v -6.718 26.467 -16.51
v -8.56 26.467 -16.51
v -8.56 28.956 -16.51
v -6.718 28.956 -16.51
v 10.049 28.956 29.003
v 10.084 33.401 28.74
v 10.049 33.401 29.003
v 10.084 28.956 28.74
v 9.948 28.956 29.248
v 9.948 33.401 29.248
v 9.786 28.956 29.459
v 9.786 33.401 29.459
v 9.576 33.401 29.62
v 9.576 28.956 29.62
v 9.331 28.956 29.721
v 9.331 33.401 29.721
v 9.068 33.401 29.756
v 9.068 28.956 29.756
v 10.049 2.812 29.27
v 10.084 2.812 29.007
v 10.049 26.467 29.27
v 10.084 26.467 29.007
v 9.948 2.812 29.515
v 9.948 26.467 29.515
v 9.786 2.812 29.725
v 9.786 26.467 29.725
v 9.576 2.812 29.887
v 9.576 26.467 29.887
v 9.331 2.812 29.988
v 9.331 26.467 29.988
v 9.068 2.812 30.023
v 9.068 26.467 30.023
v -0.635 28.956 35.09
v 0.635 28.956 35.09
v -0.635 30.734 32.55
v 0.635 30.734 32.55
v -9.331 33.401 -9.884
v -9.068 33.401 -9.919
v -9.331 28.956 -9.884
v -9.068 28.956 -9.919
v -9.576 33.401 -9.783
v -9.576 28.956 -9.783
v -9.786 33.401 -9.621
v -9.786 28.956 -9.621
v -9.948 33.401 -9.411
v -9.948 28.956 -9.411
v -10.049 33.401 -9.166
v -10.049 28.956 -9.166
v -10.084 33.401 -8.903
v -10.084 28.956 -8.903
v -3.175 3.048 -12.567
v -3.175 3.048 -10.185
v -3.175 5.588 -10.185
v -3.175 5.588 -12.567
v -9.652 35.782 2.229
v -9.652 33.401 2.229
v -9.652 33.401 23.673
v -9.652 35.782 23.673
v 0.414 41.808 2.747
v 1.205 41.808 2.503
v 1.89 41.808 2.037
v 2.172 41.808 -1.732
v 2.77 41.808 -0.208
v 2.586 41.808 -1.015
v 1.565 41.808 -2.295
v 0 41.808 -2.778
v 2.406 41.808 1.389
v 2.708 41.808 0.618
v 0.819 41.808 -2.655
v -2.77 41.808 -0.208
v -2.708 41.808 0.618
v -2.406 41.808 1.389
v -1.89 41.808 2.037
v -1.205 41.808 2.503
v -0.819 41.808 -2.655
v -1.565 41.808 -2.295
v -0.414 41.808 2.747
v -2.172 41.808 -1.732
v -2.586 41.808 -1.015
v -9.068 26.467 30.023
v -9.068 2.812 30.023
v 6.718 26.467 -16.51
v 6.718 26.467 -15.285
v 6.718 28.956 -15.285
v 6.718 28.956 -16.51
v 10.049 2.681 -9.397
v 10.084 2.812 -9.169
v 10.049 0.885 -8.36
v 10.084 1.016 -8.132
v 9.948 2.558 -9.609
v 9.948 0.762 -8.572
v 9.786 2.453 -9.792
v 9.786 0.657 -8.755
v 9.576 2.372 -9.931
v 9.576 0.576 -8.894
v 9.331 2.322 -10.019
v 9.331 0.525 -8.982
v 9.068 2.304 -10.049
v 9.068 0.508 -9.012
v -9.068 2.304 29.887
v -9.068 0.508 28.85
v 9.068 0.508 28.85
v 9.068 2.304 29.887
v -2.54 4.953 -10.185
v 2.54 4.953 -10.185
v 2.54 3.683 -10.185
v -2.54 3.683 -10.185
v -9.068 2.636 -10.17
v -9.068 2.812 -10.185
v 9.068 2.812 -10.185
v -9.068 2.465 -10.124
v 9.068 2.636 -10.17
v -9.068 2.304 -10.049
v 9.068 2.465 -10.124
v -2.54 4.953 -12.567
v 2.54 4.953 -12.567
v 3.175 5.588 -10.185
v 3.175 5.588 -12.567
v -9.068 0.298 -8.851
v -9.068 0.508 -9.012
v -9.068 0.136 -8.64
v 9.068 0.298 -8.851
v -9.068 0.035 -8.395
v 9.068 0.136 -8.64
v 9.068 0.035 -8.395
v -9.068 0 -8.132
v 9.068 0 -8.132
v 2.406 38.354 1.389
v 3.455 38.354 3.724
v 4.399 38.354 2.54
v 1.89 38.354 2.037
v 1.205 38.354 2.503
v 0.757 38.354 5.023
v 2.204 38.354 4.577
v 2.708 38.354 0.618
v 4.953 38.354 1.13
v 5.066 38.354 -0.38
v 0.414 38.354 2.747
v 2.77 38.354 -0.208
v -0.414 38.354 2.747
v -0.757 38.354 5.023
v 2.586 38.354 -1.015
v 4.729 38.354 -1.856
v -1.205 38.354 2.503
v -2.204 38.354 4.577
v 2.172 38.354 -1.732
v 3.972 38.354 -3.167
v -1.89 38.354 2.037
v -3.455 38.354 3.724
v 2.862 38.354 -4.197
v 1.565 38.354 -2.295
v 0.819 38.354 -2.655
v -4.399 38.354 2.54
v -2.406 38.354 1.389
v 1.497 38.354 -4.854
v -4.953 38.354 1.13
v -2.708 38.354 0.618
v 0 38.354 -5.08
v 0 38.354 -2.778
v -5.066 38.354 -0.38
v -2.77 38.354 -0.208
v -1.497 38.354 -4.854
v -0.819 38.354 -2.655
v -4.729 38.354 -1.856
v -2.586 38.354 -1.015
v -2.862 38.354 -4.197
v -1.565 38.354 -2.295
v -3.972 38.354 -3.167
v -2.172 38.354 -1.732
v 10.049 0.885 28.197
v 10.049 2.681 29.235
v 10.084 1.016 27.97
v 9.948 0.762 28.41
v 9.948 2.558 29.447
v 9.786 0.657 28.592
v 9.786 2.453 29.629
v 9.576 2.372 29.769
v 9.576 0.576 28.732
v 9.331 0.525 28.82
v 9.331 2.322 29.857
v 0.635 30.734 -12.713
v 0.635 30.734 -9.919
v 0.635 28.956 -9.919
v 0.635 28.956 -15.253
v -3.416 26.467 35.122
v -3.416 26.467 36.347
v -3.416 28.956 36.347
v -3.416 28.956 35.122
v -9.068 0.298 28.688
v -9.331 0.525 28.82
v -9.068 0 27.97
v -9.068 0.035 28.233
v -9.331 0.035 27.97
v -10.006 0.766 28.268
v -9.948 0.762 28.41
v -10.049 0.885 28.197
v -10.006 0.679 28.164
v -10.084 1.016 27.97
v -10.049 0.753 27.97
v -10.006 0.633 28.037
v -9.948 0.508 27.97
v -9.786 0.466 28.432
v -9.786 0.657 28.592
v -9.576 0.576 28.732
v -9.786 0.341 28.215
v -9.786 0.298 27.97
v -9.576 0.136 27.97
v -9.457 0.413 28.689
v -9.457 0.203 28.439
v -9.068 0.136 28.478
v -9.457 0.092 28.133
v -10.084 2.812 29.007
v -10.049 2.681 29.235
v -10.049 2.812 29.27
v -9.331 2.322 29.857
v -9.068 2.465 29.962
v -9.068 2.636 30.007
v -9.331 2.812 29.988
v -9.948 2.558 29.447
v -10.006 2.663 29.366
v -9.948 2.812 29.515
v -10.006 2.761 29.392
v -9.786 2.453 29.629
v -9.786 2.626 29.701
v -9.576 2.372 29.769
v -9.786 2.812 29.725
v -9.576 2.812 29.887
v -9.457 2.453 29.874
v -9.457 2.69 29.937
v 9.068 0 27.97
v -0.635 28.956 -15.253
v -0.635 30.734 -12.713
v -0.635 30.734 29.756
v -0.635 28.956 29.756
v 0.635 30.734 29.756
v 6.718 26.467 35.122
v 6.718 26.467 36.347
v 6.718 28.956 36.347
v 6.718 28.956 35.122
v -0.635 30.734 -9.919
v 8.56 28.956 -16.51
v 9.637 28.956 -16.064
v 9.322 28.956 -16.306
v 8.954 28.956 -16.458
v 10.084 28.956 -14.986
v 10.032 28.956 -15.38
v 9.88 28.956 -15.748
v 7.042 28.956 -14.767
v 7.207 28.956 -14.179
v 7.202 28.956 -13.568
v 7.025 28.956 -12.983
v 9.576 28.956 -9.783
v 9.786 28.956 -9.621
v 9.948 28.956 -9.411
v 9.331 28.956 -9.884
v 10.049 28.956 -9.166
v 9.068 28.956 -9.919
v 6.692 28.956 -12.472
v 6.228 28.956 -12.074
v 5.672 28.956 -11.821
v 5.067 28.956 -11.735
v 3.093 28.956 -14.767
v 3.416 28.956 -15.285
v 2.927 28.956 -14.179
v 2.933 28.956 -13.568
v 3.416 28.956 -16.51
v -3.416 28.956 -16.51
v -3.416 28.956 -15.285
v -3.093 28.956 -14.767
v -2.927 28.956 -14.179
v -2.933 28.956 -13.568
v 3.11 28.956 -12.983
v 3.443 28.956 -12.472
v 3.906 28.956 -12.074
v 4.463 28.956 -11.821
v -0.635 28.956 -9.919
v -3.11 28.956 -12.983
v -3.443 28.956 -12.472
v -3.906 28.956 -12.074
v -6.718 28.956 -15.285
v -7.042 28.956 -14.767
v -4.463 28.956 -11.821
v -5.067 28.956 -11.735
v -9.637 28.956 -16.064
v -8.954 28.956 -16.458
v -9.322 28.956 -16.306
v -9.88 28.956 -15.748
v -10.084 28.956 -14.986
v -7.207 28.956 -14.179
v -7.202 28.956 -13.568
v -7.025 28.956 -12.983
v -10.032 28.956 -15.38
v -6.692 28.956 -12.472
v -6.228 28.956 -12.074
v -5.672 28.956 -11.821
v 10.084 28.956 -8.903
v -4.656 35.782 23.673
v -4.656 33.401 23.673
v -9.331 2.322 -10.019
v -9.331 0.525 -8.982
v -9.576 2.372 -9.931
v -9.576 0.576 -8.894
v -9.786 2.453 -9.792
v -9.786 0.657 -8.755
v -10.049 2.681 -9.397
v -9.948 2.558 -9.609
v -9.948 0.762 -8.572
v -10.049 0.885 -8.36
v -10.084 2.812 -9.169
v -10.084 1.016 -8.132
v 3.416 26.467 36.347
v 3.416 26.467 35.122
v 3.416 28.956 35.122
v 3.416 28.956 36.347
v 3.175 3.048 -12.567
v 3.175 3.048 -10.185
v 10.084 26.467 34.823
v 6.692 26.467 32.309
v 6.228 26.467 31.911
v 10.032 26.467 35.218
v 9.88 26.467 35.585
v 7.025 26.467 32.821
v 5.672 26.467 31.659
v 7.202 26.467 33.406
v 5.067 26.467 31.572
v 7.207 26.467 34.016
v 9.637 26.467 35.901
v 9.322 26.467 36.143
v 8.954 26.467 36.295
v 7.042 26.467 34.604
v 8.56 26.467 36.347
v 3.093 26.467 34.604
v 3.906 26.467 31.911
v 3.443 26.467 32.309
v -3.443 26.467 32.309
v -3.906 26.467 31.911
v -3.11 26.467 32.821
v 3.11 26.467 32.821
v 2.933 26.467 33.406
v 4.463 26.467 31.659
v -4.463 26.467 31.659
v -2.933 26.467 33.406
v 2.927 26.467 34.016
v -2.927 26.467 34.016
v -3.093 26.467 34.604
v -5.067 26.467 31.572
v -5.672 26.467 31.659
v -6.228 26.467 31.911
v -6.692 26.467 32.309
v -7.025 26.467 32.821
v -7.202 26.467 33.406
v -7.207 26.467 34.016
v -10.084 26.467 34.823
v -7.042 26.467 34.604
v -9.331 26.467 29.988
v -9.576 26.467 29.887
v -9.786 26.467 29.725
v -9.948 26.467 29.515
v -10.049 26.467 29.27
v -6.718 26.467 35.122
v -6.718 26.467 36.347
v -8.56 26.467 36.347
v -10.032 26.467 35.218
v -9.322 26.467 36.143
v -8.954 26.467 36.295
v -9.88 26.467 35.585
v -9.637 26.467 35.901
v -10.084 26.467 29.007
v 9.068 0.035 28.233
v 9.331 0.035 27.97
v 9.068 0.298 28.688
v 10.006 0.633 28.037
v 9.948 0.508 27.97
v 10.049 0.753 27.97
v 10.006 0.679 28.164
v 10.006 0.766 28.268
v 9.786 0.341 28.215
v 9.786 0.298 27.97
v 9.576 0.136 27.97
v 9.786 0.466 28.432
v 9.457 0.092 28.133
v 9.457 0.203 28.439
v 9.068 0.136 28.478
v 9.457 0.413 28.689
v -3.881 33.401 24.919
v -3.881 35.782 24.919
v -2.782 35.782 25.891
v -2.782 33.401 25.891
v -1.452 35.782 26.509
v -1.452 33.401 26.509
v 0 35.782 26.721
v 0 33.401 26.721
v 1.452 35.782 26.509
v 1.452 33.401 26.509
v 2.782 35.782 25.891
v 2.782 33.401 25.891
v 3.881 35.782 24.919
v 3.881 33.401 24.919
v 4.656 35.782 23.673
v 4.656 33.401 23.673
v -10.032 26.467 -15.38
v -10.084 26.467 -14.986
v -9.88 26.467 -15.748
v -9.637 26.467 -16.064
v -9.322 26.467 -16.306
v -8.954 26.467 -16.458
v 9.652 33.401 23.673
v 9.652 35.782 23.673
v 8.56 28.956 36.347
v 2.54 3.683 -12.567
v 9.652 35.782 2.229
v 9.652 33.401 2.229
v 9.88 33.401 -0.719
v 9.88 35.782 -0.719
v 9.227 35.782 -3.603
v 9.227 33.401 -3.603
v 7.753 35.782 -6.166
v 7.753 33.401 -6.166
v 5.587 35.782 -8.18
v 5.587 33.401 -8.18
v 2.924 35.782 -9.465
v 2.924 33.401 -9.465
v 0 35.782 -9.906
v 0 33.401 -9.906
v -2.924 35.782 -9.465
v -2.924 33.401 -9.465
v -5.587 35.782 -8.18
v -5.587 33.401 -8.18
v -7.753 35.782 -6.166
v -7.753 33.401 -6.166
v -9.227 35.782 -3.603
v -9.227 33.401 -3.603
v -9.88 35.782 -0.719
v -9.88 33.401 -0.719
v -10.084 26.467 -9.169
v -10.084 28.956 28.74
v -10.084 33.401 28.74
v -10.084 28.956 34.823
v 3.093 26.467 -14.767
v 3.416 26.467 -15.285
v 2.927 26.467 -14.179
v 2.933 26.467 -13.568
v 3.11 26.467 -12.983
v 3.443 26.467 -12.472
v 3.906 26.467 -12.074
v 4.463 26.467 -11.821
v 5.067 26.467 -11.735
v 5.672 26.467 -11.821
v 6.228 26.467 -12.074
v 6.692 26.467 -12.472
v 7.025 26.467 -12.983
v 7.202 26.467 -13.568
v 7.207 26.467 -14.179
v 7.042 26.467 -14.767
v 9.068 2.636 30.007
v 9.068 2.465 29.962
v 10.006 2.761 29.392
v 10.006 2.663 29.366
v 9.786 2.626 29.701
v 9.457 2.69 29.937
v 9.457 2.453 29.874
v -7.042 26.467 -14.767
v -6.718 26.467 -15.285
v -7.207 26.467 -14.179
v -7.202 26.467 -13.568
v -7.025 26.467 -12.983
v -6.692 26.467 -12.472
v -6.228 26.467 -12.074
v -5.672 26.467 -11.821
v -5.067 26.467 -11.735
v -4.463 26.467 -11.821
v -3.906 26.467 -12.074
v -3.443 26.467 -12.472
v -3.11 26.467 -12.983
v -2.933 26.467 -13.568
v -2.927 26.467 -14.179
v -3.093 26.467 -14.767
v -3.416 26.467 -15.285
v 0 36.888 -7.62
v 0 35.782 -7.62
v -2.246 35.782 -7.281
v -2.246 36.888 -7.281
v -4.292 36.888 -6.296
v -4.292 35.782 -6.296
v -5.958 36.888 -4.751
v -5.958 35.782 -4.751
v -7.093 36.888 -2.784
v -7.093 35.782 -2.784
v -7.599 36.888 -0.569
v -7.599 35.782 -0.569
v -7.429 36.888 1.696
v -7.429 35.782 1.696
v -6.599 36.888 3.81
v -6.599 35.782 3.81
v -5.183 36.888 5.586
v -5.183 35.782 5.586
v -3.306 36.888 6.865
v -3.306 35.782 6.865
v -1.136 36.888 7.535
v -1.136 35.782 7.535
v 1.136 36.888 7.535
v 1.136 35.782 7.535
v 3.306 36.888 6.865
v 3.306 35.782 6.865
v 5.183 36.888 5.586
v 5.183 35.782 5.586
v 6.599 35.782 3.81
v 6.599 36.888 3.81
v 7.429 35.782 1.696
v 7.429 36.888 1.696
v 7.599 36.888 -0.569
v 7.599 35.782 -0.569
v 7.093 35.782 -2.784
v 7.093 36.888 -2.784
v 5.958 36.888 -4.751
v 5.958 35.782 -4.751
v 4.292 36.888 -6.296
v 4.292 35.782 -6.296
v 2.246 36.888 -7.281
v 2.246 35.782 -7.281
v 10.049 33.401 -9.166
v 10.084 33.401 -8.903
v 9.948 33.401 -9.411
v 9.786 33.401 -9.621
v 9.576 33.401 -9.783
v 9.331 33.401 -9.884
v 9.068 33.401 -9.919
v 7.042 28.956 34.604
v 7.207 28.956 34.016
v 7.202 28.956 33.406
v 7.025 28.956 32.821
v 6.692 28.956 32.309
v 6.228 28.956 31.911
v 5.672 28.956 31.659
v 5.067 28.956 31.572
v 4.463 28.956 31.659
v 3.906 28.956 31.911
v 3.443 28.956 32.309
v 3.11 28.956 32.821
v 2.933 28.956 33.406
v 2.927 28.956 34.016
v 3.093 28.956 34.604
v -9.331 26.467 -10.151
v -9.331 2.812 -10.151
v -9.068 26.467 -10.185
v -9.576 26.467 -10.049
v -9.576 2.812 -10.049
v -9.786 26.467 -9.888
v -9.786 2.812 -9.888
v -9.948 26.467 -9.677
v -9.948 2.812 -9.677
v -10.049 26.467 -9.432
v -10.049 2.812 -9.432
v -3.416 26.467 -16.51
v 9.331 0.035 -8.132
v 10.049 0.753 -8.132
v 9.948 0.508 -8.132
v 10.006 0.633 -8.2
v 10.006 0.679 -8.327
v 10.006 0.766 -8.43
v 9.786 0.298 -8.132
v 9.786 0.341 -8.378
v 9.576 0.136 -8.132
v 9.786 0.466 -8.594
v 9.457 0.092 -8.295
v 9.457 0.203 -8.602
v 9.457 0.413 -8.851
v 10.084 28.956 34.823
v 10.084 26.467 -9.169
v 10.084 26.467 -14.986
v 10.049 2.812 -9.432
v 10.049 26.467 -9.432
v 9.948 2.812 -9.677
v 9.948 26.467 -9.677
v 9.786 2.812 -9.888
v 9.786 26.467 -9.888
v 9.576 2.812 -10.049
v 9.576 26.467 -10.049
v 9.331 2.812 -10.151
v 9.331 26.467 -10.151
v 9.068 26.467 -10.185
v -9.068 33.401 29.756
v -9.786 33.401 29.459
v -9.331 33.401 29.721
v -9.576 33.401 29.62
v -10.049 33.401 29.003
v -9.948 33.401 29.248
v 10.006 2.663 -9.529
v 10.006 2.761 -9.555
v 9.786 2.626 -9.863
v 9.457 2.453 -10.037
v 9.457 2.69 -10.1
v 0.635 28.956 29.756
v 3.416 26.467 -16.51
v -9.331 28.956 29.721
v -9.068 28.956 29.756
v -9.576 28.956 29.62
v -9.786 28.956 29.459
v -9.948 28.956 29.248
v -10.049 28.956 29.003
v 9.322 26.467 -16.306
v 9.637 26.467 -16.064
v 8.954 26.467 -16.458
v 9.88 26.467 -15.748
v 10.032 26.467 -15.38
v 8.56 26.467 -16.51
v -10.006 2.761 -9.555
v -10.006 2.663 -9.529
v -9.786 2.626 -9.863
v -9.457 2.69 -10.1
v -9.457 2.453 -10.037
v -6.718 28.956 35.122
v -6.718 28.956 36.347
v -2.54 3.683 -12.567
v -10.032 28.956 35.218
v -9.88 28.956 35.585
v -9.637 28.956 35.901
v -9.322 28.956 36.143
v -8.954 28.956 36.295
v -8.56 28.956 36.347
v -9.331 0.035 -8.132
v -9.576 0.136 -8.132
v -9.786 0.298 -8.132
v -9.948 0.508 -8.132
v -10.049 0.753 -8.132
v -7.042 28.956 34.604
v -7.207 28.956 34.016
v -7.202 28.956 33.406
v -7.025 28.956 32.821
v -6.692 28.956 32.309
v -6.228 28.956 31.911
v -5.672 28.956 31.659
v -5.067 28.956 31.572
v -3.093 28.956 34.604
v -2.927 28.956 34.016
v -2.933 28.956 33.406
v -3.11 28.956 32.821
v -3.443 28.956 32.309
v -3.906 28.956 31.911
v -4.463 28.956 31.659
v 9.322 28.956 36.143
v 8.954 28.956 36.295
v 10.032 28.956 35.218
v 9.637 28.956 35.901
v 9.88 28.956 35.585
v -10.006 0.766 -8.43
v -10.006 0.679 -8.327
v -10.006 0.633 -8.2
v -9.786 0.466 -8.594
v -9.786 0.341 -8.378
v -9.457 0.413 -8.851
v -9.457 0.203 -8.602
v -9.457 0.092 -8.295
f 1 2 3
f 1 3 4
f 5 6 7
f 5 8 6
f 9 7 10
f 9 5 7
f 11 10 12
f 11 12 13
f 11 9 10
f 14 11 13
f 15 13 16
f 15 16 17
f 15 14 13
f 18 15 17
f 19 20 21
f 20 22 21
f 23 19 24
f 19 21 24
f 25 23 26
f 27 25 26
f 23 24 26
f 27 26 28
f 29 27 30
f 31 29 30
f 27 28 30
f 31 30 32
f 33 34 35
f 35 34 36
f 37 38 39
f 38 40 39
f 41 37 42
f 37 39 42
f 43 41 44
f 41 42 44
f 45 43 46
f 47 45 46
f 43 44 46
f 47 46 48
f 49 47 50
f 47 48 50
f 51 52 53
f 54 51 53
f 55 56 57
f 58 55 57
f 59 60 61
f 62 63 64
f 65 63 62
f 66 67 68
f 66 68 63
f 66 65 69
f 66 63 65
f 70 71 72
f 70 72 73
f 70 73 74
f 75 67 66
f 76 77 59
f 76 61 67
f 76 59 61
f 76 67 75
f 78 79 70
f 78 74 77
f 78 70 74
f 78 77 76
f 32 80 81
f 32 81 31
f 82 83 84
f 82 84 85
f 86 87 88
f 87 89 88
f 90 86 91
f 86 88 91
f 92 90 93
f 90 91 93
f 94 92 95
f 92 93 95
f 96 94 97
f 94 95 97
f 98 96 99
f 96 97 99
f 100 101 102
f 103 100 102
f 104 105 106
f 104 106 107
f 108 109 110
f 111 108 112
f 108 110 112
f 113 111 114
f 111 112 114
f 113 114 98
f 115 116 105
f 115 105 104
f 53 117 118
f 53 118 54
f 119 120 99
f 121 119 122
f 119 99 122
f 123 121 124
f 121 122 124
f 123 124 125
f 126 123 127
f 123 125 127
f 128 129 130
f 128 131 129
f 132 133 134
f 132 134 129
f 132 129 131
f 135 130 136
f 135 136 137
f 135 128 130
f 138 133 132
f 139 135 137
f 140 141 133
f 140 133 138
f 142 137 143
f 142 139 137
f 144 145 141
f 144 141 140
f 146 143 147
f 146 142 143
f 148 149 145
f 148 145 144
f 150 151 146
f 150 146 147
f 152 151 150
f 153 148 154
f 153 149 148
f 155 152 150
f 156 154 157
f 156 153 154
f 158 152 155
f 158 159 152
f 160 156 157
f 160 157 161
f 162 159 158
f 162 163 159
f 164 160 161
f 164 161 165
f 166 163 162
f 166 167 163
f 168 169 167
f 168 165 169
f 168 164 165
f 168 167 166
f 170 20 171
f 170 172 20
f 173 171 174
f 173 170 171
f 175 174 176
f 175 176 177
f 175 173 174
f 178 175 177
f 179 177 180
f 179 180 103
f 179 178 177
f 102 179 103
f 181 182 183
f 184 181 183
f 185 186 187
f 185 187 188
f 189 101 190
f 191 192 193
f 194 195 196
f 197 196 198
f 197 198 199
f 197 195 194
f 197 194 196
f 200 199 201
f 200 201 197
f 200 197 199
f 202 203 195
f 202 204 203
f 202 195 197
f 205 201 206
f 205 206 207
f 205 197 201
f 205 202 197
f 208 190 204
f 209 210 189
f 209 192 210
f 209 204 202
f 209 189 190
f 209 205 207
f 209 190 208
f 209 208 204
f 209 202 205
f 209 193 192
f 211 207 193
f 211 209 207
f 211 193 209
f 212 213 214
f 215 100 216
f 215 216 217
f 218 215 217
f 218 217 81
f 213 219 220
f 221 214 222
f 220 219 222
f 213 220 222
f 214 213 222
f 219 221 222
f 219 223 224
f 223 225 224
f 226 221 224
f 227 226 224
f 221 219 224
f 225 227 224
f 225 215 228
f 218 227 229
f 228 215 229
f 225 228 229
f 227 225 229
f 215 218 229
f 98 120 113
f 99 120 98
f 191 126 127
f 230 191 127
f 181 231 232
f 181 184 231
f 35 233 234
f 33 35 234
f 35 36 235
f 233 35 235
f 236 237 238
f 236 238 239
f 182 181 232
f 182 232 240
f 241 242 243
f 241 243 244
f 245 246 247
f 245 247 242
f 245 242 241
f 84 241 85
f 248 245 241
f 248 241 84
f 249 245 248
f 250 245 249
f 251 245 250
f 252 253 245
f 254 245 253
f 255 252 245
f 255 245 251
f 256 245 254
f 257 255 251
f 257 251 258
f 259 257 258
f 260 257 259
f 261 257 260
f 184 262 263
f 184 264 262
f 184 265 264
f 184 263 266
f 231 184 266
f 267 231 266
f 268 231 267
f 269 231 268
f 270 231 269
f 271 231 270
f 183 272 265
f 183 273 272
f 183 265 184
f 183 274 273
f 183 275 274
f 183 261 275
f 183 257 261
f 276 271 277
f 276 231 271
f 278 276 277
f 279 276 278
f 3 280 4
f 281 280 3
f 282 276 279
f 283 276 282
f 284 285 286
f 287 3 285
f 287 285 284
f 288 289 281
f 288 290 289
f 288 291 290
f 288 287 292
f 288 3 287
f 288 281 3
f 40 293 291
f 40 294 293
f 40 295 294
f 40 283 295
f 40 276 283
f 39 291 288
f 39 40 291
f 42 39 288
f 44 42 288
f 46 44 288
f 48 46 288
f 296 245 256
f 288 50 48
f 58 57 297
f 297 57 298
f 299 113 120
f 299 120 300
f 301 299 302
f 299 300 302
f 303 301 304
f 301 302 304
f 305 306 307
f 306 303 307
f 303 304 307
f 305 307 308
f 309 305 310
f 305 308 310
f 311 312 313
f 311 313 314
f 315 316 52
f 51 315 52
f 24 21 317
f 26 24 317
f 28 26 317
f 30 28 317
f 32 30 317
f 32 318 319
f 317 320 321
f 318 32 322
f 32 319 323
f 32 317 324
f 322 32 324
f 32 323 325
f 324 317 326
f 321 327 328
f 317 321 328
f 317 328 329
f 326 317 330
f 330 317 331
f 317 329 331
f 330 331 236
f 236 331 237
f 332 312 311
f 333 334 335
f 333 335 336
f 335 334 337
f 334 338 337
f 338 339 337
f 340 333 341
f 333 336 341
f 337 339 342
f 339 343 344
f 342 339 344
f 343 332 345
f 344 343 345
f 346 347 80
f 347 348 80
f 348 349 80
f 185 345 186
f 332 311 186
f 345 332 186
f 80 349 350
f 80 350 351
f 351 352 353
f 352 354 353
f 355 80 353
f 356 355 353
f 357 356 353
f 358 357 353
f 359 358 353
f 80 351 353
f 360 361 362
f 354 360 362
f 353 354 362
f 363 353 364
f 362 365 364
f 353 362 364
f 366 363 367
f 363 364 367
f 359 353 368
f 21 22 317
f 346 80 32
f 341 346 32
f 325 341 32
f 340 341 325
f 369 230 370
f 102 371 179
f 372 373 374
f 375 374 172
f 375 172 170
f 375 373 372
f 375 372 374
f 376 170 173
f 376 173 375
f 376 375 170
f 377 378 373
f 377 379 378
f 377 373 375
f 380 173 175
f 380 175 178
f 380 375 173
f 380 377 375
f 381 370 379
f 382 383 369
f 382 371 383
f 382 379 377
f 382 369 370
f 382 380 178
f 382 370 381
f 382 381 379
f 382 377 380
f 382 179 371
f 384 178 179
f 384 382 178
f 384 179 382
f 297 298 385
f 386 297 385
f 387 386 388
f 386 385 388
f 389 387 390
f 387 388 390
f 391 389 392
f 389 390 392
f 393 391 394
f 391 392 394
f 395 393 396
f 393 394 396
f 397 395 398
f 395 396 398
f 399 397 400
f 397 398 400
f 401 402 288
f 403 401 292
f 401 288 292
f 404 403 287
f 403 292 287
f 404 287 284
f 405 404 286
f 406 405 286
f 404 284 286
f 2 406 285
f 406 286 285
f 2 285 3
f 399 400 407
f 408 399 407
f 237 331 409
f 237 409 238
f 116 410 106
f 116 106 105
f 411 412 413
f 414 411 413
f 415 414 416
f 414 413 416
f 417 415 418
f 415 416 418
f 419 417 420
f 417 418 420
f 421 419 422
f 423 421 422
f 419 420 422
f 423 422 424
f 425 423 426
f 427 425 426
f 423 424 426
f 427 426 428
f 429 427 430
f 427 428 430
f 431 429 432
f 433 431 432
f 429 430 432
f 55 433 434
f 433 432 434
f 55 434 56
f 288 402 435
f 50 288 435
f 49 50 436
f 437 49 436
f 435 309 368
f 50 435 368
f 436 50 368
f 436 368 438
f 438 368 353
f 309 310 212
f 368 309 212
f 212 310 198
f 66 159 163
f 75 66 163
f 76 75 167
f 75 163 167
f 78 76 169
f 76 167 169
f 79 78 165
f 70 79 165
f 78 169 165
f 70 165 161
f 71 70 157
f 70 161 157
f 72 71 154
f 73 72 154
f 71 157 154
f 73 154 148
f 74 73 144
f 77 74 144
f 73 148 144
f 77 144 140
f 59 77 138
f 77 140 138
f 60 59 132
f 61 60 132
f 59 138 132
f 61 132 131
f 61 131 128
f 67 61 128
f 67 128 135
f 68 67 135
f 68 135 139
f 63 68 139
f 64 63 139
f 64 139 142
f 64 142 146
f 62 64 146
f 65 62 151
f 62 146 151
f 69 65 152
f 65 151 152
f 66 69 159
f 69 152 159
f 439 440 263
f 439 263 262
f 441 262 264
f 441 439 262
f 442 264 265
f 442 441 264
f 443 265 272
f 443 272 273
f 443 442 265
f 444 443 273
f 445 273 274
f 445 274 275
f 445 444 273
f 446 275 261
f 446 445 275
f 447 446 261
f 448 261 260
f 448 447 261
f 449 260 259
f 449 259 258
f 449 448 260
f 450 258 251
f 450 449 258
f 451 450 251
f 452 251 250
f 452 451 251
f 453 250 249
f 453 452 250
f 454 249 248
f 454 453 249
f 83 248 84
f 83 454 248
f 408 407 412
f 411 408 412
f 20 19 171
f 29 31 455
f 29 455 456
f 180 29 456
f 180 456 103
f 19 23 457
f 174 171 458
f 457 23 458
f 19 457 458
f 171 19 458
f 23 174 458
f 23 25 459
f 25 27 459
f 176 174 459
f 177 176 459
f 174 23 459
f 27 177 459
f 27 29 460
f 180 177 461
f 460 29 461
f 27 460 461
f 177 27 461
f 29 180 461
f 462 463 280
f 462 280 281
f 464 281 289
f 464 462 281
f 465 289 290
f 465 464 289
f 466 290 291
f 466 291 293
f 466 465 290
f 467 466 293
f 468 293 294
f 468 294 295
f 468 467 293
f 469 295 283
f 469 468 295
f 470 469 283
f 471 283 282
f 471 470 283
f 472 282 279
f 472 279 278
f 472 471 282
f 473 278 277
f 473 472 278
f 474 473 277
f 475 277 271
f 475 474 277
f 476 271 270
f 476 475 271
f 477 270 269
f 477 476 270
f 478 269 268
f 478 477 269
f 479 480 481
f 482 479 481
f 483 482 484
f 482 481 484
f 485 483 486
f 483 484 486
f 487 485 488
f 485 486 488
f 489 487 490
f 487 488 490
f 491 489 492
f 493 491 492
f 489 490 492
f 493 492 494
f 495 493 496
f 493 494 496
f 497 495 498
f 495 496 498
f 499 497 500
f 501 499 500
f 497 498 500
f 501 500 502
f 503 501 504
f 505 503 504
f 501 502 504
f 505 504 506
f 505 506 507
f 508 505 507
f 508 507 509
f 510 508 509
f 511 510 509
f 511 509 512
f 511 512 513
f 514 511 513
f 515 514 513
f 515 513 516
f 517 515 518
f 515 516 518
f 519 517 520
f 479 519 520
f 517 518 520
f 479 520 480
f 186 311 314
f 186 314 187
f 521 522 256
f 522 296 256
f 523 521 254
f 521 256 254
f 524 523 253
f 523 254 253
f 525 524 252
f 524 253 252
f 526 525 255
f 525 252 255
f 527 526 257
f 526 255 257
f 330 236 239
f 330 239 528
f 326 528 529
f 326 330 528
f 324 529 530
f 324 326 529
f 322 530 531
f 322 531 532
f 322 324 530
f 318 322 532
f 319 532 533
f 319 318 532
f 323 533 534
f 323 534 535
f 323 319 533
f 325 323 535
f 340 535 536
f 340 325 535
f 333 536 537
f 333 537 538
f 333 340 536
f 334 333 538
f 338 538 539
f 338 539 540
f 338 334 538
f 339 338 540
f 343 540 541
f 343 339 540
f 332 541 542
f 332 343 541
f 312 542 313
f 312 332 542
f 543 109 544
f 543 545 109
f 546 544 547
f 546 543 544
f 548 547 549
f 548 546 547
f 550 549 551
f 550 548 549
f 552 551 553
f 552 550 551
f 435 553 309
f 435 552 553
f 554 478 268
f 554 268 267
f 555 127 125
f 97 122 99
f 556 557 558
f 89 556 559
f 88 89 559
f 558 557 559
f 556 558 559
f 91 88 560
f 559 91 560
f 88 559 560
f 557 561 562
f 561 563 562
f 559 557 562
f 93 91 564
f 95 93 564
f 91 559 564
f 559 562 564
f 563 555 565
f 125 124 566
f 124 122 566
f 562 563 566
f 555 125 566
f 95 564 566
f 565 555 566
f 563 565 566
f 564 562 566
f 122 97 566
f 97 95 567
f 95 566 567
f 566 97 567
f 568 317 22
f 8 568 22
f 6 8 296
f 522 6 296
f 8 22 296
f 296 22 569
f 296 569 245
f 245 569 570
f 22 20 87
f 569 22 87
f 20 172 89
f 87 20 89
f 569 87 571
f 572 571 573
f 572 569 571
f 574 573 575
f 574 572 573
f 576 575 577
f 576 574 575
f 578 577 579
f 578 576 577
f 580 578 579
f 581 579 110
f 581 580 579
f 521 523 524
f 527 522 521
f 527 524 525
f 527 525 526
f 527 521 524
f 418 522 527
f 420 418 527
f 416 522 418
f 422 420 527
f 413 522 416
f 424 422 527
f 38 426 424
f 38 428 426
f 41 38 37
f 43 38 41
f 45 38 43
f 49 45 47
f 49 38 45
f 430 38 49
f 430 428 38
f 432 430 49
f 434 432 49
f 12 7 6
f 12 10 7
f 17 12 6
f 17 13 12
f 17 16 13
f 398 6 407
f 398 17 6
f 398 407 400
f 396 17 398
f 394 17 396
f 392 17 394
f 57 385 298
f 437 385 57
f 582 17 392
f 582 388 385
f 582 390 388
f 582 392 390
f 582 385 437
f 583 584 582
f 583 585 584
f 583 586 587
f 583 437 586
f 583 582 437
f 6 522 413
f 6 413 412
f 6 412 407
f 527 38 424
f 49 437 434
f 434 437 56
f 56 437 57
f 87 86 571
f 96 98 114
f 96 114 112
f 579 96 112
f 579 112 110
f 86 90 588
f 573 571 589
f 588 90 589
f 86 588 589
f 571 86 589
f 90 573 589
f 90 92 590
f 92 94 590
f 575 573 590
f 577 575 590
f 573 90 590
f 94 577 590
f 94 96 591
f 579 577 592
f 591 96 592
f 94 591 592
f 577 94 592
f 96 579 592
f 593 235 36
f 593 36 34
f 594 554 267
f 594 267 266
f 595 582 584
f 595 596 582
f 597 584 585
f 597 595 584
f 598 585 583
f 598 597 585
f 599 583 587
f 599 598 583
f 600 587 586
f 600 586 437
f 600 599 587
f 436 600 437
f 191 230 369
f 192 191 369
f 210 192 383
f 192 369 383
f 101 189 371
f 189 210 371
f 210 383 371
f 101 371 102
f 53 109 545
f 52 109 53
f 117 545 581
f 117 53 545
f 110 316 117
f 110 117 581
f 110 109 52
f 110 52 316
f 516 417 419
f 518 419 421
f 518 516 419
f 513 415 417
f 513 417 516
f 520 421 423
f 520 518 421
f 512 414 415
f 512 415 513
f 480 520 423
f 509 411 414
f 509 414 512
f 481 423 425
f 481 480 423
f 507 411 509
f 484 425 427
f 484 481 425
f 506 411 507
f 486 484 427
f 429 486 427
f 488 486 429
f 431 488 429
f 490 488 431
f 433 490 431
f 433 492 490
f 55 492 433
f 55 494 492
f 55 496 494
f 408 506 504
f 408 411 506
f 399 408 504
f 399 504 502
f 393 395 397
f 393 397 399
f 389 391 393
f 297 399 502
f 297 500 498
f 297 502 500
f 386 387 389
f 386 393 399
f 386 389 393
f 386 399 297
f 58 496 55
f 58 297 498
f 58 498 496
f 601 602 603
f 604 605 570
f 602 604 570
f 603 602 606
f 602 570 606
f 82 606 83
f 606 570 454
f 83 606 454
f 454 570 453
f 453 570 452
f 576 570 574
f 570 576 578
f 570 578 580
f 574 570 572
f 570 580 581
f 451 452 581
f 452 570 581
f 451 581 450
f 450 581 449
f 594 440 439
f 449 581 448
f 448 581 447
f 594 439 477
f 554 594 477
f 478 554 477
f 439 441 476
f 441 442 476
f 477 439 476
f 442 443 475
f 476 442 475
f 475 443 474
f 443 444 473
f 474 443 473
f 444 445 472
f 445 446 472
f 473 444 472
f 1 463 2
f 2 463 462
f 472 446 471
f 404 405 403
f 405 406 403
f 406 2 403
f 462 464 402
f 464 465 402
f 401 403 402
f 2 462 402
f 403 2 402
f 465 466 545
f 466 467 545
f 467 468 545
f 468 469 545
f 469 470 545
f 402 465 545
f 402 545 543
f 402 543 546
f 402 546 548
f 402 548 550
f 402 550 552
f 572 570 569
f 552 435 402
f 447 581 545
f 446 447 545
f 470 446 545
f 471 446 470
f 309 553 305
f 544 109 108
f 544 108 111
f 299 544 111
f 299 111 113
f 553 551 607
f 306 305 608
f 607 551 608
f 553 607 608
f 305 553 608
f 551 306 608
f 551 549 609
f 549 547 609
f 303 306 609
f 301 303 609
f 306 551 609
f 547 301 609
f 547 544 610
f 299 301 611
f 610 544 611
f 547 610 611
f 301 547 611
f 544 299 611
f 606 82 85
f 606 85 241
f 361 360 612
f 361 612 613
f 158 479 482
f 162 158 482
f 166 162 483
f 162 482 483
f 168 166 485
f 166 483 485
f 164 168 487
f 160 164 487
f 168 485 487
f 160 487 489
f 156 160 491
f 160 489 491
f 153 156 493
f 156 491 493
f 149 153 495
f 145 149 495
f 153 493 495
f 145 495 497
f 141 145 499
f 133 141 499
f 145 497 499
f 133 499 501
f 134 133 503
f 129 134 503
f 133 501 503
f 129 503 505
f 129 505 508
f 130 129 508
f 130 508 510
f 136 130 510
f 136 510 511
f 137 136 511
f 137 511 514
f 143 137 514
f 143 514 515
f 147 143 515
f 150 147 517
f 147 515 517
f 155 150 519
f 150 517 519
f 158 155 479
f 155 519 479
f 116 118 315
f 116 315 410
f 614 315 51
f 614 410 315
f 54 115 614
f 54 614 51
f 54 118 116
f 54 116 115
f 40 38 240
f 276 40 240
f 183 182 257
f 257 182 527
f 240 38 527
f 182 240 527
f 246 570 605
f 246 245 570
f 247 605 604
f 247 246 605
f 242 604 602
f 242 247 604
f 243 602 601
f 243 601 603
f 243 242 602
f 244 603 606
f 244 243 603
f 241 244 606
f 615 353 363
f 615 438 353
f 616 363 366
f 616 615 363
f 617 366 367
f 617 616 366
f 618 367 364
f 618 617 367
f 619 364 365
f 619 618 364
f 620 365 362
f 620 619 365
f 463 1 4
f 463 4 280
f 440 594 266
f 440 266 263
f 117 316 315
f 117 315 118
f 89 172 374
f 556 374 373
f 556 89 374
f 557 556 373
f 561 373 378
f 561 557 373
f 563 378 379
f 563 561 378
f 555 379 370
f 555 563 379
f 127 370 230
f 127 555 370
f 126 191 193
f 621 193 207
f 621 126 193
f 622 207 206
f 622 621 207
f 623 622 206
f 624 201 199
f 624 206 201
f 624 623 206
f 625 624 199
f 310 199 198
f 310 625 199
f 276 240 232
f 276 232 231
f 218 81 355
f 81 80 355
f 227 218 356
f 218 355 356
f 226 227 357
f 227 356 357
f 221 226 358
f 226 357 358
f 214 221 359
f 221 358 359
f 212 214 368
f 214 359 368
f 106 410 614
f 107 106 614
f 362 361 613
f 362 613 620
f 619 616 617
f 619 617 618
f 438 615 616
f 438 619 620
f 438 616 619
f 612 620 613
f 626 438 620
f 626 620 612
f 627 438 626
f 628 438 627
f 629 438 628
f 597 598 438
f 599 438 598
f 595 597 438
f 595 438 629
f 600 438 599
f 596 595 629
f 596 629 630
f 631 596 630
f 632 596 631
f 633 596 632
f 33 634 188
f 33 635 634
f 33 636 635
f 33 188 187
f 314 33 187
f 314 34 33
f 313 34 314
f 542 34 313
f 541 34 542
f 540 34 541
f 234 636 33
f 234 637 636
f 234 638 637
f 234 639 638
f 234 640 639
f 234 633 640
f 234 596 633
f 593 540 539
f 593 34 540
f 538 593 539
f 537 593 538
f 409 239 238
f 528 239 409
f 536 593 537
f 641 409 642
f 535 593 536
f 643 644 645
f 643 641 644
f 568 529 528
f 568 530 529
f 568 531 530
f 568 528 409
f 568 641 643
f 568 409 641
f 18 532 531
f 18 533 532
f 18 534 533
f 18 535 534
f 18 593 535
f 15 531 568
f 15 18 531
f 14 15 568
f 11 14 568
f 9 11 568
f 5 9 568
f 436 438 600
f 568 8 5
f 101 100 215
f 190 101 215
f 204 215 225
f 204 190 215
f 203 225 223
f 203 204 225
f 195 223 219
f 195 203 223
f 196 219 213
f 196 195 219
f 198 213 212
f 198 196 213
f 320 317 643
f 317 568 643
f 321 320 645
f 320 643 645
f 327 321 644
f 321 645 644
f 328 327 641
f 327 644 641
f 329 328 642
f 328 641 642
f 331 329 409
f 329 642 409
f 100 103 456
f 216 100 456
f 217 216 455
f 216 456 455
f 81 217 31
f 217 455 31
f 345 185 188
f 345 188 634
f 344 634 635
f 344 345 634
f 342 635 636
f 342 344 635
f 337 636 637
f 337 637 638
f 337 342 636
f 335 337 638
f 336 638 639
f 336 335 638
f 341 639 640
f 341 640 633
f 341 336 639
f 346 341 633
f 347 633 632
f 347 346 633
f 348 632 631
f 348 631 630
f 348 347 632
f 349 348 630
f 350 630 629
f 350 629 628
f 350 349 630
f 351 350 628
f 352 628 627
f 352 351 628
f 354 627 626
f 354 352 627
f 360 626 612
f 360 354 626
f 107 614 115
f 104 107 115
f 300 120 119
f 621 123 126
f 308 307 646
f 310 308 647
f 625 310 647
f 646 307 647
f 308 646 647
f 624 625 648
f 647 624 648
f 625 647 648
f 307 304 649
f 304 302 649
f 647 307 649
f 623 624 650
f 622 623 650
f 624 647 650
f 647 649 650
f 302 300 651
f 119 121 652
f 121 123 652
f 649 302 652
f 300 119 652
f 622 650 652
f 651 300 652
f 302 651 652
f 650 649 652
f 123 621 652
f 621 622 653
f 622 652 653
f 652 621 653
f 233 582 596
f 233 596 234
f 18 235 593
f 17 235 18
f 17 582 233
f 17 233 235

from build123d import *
from OCP.BRepFilletAPI import BRepFilletAPI_MakeChamfer

# Parameters (mm, degrees)
SKETCH1_W          = 20.1676
SKETCH1_H          = 40.2082
EXTRUDE1_DEPTH     = 26.4668
SKETCH2_W          = 20.1676
SKETCH2_H          = 40.2082
EXTRUDE2_DEPTH     = 2.4892
SKETCH3_W          = 20.1676
SKETCH3_H          = 40.2082
EXTRUDE3_DEPTH     = 4.445
SKETCH11_W         = 20.1676
SKETCH11_H         = 0.2667
CUT_EXTRUDE2_DEPTH = 4.445
EXTRUDE4_DEPTH     = 2.38125
SKETCH5_R          = 7.62
EXTRUDE5_DEPTH     = 2.57175
CHAMFER1_SIZE      = 2.54
CHAMFER1_SIZE2     = 1.466469684
EXTRUDE6_DEPTH     = 0.635
SKETCH8_R          = 2.778125
EXTRUDE7_DEPTH     = 3.4544
CHAMFER2_SIZE      = 2.54
CHAMFER2_SIZE2     = 1.466469684
FILLET1_R          = 1.016
FILLET2_R          = 1.524
SKETCH9_W          = 6.35
SKETCH9_H          = 2.54
EXTRUDE8_DEPTH     = 2.38125
SKETCH10_W         = 5.08
SKETCH10_H         = 1.27
CUT_EXTRUDE1_DEPTH = 2.38125


with BuildPart() as part:
    # Sketch1 → Extrude1 (new body)
    with BuildSketch(Plane(origin=(0, 0, 0), x_dir=(1, 0, 0), z_dir=(0, 1, 0))):
        with Locations((0, -9.9187)):
            Rectangle(SKETCH1_W, SKETCH1_H)
    extrude(amount=EXTRUDE1_DEPTH)

    # Sketch2 → Extrude2 (add)
    with BuildSketch(Plane(origin=(0, 26.4668, 0), x_dir=(-1, 0, 0), z_dir=(0, 1, 0))):
        with Locations((0, 9.9187)):
            Rectangle(SKETCH2_W, SKETCH2_H)
        with BuildLine():
            ThreePointArc((6.7183, -15.285015296), (5.0673, -11.7348), (3.4163, -15.285015296))
            Line((3.4163, -15.285015296), (3.4163, -16.51))
            Line((3.4163, -16.51), (-3.4163, -16.51))
            Line((-3.4163, -16.51), (-3.4163, -15.285015296))
            ThreePointArc((-3.4163, -15.285015296), (-5.0673, -11.7348), (-6.7183, -15.285015296))
            Line((-6.7183, -15.285015296), (-6.7183, -16.51))
            Line((-6.7183, -16.51), (-10.0838, -16.51))
            Line((-10.0838, -16.51), (-10.0838, -10.1854))
            Line((-10.0838, -10.1854), (10.0838, -10.1854))
            Line((10.0838, -10.1854), (10.0838, -16.51))
            Line((10.0838, -16.51), (6.7183, -16.51))
            Line((6.7183, -16.51), (6.7183, -15.285015296))
        make_face()
        with BuildLine():
            ThreePointArc((-6.7183, 35.122415296), (-5.0673, 31.5722), (-3.4163, 35.122415296))
            Line((-3.4163, 35.122415296), (-3.4163, 36.3474))
            Line((-3.4163, 36.3474), (3.4163, 36.3474))
            Line((3.4163, 36.3474), (3.4163, 35.122415296))
            ThreePointArc((3.4163, 35.122415296), (5.0673, 31.5722), (6.7183, 35.122415296))
            Line((6.7183, 35.122415296), (6.7183, 36.3474))
            Line((6.7183, 36.3474), (10.0838, 36.3474))
            Line((10.0838, 36.3474), (10.0838, 30.0228))
            Line((10.0838, 30.0228), (-10.0838, 30.0228))
            Line((-10.0838, 30.0228), (-10.0838, 36.3474))
            Line((-10.0838, 36.3474), (-6.7183, 36.3474))
            Line((-6.7183, 36.3474), (-6.7183, 35.122415296))
        make_face()
    extrude(amount=EXTRUDE2_DEPTH)

    # Sketch3 → Extrude3 (add)
    with BuildSketch(Plane(origin=(0, 28.956, 0), x_dir=(-1, 0, 0), z_dir=(0, 1, 0))):
        with Locations((0, 9.9187)):
            Rectangle(SKETCH3_W, SKETCH3_H)
    extrude(amount=EXTRUDE3_DEPTH)

    # Sketch11 → Cut-Extrude2 (cut)
    with BuildSketch(Plane(origin=(0, 33.401, 0), x_dir=(1, 0, 0), z_dir=(0, 1, 0))):
        with Locations((0, 10.05205)):
            Rectangle(SKETCH11_W, SKETCH11_H)
        with Locations((0, -29.88945)):
            Rectangle(SKETCH11_W, SKETCH11_H)
    extrude(amount=-CUT_EXTRUDE2_DEPTH, mode=Mode.SUBTRACT)

    # Sketch4 → Extrude4 (add)
    with BuildSketch(Plane(origin=(0, 33.401, 0), x_dir=(-1, 0, 0), z_dir=(0, 1, 0))):
        with BuildLine():
            Line((9.652, 2.228840954), (9.652, 23.6728))
            Line((9.652, 23.6728), (4.655896906, 23.6728))
            ThreePointArc((4.655896906, 23.6728), (0, 26.7208), (-4.655896906, 23.6728))
            Line((-4.655896906, 23.6728), (-9.652, 23.6728))
            Line((-9.652, 23.6728), (-9.652, 2.228840954))
            ThreePointArc((-9.652, 2.228840954), (0, -9.906), (9.652, 2.228840954))
        make_face()
    extrude(amount=EXTRUDE4_DEPTH)

    # Sketch5 → Extrude5 (add)
    with BuildSketch(Plane(origin=(0, 35.78225, 0), x_dir=(-1, 0, 0), z_dir=(0, 1, 0))):
        with Locations(Location((0, 0, 0), (0, 0, 270))):
            Circle(SKETCH5_R)
    extrude(amount=EXTRUDE5_DEPTH)

    # Chamfer1
    chamfer1_edges = [part.edges().sort_by_distance(p)[0] for p in [
        (0, 38.354, 7.62),
    ]]
    chamfer1_side = [part.faces().sort_by_distance(p)[0] for p in [
        (0, 38.354, 0),
    ]]
    chamfer(chamfer1_edges, length=CHAMFER1_SIZE, length2=CHAMFER1_SIZE2, reference=chamfer1_side[0])

    # Sketch7 → Extrude6 (add, symmetric)
    with BuildSketch(Plane(origin=(0, 0, 0), x_dir=(0, 0, -1), z_dir=(1, 0, 0))):
        Polygon((15.2527, 28.956), (12.7127, 30.734), (9.9187, 30.734), (9.9187, 28.956), align=None)
    extrude6 = extrude(amount=EXTRUDE6_DEPTH, both=True)

    # Mirror1: Extrude6 across plane
    add(extrude6.mirror(Plane(origin=(0, 0, 9.9187), x_dir=(1, 0, 0), z_dir=(0, 0, -1))))

    # Sketch8 → Extrude7 (add)
    with BuildSketch(Plane(origin=(0, 38.354, 0), x_dir=(-1, 0, 0), z_dir=(0, 1, 0))):
        with Locations(Location((0, 0, 0), (0, 0, 270))):
            Circle(SKETCH8_R)
    extrude(amount=EXTRUDE7_DEPTH)

    # Chamfer2: one chamfer whose edges measure the first distance from different faces: ONE call of the kernel's chamfer builder (chamfer() names one face for all edges)
    chamfer2_edges_1 = [part.edges().sort_by_distance(p)[0] for p in [
        (0, 0, -10.1854),
    ]]
    chamfer2_side_1 = [part.faces().sort_by_distance(p)[0] for p in [
        (0, 13.2334, -10.1854),
    ]]
    chamfer2_edges_2 = [part.edges().sort_by_distance(p)[0] for p in [
        (0, 0, 30.0228),
    ]]
    chamfer2_side_2 = [part.faces().sort_by_distance(p)[0] for p in [
        (0, 13.2334, 30.0228),
    ]]
    chamfer2 = BRepFilletAPI_MakeChamfer(part.part.solid().wrapped)
    for e in chamfer2_edges_1:
        chamfer2.Add(CHAMFER2_SIZE, CHAMFER2_SIZE2, e.wrapped, chamfer2_side_1[0].wrapped)  # the first distance lies on this face
    for e in chamfer2_edges_2:
        chamfer2.Add(CHAMFER2_SIZE, CHAMFER2_SIZE2, e.wrapped, chamfer2_side_2[0].wrapped)  # the first distance lies on this face
    add(Compound.cast(chamfer2.Shape()), mode=Mode.REPLACE)

    # Fillet1
    fillet1_edges = [part.edges().sort_by_distance(p)[0] for p in [
        (10.0838, 0, 9.9187),
        (10.0838, 1.27, -9.452165158),
        (10.0838, 14.5034, -10.1854),
        (0, 0, -8.718930316),
        (0, 2.54, -10.1854),
        (-10.0838, 14.5034, -10.1854),
        (-10.0838, 1.27, -9.452165158),
        (10.0838, 14.5034, 30.0228),
        (10.0838, 1.27, 29.289565158),
        (0, 2.54, 30.0228),
        (-10.0838, 0, 9.9187),
        (0, 0, 28.556330316),
        (-10.0838, 1.27, 29.289565158),
        (-10.0838, 14.5034, 30.0228),
        (10.0838, 31.1785, 29.7561),
        (-10.0838, 31.1785, 29.7561),
        (10.0838, 31.1785, -9.9187),
        (-10.0838, 31.1785, -9.9187),
    ]]
    fillet(fillet1_edges, radius=FILLET1_R)

    # Fillet2
    fillet2_edges = [part.edges().sort_by_distance(p)[0] for p in [
        (-10.0838, 27.7114, 36.3474),
        (10.0838, 27.7114, 36.3474),
        (-10.0838, 27.7114, -16.51),
        (10.0838, 27.7114, -16.51),
    ]]
    fillet(fillet2_edges, radius=FILLET2_R)

    # Sketch9 → Extrude8 (add)
    with BuildSketch(Plane(origin=(0, 0, -10.1854), x_dir=(-1, 0, 0), z_dir=(0, 0, -1))):
        with Locations((0, 4.318)):
            Rectangle(SKETCH9_W, SKETCH9_H)
    extrude(amount=EXTRUDE8_DEPTH)

    # Sketch10 → Cut-Extrude1 (cut)
    with BuildSketch(Plane(origin=(0, 0, -12.56665), x_dir=(-1, 0, 0), z_dir=(0, 0, -1))):
        with Locations((0, 4.318)):
            Rectangle(SKETCH10_W, SKETCH10_H)
    extrude(amount=-CUT_EXTRUDE1_DEPTH, mode=Mode.SUBTRACT)


solid = part.part
